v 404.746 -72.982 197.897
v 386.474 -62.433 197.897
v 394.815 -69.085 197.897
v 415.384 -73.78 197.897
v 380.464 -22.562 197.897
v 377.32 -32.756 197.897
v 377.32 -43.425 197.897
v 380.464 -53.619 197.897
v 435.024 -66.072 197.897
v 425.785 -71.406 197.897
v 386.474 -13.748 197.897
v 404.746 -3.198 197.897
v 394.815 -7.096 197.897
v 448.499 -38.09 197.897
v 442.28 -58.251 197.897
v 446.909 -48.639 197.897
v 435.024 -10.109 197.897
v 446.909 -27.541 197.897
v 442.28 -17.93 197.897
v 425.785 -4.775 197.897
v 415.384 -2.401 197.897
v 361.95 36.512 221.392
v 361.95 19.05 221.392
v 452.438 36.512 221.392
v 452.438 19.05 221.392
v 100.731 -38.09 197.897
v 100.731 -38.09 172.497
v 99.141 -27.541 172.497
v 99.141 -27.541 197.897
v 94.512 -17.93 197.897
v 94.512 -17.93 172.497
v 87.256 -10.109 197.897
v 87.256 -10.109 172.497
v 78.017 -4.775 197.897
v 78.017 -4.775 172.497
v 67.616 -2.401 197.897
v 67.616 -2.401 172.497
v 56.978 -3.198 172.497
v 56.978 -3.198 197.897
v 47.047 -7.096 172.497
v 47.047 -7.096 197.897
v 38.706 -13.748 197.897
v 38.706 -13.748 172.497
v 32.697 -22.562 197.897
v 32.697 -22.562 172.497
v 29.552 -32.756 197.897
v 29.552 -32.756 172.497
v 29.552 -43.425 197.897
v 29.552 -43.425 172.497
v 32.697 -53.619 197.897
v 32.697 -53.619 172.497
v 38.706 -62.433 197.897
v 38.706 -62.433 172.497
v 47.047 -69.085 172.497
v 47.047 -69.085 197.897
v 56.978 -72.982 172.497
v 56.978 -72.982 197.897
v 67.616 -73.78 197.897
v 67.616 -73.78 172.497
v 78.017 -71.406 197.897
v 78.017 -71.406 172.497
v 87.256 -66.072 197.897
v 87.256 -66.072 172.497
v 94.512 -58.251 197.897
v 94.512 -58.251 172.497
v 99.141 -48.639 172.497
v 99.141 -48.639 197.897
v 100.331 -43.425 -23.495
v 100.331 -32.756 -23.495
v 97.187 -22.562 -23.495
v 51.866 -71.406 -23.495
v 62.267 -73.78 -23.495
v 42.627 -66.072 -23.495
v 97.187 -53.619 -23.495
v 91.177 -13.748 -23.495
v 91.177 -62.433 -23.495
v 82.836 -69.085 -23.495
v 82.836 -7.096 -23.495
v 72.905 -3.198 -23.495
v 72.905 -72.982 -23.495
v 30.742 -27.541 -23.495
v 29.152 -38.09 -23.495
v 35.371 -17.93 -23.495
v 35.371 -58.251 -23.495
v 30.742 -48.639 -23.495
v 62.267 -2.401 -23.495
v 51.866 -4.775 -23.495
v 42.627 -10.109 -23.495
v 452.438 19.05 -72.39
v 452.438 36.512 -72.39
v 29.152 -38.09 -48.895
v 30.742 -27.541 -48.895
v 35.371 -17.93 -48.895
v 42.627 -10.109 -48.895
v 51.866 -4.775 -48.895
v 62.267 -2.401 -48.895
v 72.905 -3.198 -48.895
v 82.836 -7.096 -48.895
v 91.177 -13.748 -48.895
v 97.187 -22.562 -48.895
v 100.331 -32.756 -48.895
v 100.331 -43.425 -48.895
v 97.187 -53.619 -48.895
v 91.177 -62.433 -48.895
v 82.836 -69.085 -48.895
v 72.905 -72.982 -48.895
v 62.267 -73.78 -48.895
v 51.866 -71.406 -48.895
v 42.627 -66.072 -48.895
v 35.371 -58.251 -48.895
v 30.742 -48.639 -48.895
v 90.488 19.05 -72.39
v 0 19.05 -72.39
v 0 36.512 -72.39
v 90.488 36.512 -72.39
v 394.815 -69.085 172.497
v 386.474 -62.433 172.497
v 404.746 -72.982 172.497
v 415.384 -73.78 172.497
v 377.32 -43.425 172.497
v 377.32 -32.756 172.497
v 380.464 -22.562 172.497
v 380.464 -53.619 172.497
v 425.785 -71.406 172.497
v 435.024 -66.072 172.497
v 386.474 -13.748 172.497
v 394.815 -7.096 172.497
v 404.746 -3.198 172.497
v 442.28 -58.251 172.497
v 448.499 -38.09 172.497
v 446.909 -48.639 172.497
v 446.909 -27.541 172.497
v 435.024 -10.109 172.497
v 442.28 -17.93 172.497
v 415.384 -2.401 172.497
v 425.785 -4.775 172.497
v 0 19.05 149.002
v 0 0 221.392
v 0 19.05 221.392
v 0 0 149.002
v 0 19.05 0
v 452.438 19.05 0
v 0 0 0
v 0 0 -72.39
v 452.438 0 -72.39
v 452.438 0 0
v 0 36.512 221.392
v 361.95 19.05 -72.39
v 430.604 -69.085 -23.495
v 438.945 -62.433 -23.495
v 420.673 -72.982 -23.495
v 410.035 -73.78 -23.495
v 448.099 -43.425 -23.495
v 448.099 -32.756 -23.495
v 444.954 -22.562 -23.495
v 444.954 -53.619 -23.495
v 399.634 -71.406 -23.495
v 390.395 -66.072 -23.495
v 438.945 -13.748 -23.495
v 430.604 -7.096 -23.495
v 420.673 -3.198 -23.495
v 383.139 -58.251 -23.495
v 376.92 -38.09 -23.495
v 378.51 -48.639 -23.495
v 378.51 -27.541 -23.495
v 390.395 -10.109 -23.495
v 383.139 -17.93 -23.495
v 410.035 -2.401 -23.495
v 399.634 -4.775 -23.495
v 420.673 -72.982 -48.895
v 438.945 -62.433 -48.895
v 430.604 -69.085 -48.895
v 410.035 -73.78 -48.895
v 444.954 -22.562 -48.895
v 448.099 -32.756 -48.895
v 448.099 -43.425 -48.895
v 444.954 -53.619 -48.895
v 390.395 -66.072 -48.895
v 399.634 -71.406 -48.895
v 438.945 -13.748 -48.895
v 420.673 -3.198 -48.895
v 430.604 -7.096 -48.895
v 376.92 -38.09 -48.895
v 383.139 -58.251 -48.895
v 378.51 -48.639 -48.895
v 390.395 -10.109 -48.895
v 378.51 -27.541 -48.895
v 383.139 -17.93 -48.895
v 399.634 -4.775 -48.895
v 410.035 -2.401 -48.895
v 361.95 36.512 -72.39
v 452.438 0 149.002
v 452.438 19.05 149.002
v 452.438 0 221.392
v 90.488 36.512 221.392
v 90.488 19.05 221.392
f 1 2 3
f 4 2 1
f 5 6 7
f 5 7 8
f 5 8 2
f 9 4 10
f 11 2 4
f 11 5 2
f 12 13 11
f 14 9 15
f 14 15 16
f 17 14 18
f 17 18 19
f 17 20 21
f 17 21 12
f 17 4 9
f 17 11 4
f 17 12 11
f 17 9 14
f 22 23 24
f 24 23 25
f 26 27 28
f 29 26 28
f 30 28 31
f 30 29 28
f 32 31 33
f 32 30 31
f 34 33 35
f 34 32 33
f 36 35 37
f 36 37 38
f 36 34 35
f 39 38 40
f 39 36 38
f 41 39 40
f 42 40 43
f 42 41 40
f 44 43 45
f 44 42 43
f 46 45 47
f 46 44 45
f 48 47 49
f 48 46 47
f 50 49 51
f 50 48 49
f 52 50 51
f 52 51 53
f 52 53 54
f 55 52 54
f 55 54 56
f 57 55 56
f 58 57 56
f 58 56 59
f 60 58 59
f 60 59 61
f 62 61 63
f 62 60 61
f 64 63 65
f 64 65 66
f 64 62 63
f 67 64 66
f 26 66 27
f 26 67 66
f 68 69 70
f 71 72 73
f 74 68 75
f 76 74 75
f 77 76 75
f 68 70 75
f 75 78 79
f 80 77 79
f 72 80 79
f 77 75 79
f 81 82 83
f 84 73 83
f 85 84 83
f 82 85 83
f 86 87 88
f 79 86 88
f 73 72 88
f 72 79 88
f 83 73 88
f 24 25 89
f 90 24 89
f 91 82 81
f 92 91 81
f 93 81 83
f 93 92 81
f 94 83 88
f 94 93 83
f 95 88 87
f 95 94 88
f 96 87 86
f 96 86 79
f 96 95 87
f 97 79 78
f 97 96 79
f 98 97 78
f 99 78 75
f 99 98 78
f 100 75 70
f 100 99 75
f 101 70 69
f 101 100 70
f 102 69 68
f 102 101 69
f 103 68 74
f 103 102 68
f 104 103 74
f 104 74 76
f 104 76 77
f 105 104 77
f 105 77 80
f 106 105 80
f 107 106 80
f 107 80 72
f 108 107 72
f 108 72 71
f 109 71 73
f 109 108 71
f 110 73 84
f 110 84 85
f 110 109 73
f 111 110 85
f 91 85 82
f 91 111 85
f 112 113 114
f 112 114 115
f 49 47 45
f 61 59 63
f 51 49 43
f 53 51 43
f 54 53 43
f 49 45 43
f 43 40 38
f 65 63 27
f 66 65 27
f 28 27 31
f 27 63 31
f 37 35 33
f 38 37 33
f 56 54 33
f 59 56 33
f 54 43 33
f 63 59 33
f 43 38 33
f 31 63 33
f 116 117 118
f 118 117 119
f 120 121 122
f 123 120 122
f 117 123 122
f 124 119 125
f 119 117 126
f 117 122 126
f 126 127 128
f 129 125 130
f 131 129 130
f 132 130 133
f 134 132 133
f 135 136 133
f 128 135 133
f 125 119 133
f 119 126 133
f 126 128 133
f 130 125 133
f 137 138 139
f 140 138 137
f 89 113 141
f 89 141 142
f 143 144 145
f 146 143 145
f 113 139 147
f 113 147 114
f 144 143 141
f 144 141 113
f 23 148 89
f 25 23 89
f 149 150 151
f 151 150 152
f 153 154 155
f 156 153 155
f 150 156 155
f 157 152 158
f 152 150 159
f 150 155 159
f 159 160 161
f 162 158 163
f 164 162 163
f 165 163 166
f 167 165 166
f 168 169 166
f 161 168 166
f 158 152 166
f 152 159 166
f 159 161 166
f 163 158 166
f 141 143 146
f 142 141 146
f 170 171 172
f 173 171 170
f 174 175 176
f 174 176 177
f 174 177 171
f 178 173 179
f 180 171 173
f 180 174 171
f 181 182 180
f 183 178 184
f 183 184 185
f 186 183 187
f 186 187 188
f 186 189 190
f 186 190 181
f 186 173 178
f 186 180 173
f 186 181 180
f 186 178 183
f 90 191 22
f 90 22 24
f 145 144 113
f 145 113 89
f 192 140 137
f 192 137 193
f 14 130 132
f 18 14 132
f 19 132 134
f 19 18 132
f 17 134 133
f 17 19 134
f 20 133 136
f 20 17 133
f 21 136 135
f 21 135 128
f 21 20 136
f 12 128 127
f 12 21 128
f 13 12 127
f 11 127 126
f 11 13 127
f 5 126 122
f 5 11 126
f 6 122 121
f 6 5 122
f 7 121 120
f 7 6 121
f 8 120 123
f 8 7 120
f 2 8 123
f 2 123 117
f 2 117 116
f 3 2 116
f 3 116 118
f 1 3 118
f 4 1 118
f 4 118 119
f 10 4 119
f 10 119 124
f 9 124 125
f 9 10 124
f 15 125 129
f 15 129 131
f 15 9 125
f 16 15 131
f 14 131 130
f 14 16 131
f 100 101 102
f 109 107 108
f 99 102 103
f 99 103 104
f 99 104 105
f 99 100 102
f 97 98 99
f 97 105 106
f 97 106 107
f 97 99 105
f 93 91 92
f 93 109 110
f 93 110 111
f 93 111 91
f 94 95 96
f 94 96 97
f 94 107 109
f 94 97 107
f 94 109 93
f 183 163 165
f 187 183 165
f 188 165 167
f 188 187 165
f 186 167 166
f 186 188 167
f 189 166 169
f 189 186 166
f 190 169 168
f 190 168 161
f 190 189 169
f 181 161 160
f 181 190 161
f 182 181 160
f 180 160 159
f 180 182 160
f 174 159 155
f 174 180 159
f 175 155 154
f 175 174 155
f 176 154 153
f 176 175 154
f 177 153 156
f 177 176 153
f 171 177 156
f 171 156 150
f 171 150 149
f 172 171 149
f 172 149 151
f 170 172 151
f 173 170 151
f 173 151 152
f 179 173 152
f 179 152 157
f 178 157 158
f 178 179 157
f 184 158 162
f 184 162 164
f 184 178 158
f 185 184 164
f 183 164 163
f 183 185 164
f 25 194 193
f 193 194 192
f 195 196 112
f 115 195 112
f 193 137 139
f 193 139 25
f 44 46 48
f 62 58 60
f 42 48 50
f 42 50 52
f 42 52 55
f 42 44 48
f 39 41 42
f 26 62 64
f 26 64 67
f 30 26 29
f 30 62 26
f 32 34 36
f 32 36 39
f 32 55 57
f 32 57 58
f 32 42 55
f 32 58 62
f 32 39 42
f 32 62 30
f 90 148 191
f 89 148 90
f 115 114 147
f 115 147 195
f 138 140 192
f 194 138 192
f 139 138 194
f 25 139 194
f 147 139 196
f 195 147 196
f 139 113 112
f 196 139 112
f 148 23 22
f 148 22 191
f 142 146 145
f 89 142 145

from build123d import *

# Parameters (mm, degrees)
SKETCH1_W                  = 452.4375
SKETCH1_H                  = 72.39
BOSS_EXTRUDE1_DEPTH        = 19.05
BOSS_EXTRUDE1_2_DEPTH      = 19.05
SKETCH2_W                  = 90.4875
SKETCH2_H                  = 293.781971524
BOSS_EXTRUDE2_DEPTH        = 17.4625
BOSS_EXTRUDE2_2_DEPTH      = 17.4625
SKETCH3_R                  = 35.789243898
BOSS_EXTRUDE3_DEPTH        = 12.7
BOSS_EXTRUDE3_DEPTH_BACK   = 12.7
BOSS_EXTRUDE3_2_DEPTH      = 12.7
BOSS_EXTRUDE3_2_DEPTH_BACK = 12.7
SKETCH4_R                  = 35.789243898
BOSS_EXTRUDE4_DEPTH        = 12.7
BOSS_EXTRUDE4_DEPTH_BACK   = 12.7
BOSS_EXTRUDE4_2_DEPTH      = 12.7
BOSS_EXTRUDE4_2_DEPTH_BACK = 12.7


with BuildPart() as part:
    # Sketch1 → Boss-Extrude1 (new body)
    with BuildSketch(Plane(origin=(0, 0, 0), x_dir=(1, 0, 0), z_dir=(0, 1, 0))):
        with Locations((226.21875, 36.195)):
            Rectangle(SKETCH1_W, SKETCH1_H)
    extrude(amount=BOSS_EXTRUDE1_DEPTH)


with BuildPart() as body_2:
    # Sketch1 → Boss-Extrude1 2 (new body)
    with BuildSketch(Plane(origin=(0, 0, 0), x_dir=(1, 0, 0), z_dir=(0, 1, 0))):
        with Locations((226.21875, -185.196971524)):
            Rectangle(SKETCH1_W, SKETCH1_H)
    extrude(amount=BOSS_EXTRUDE1_2_DEPTH)


with BuildPart() as body_3:
    # Sketch2 → Boss-Extrude2 (new body)
    with BuildSketch(Plane(origin=(0, 19.05, 0), x_dir=(1, 0, 0), z_dir=(0, 1, 0))):
        with Locations((407.19375, -74.500985762)):
            Rectangle(SKETCH2_W, SKETCH2_H)
    extrude(amount=BOSS_EXTRUDE2_DEPTH)


with BuildPart() as body_4:
    # Sketch2 → Boss-Extrude2 2 (new body)
    with BuildSketch(Plane(origin=(0, 19.05, 0), x_dir=(1, 0, 0), z_dir=(0, 1, 0))):
        with Locations((45.24375, -74.500985762)):
            Rectangle(SKETCH2_W, SKETCH2_H)
    extrude(amount=BOSS_EXTRUDE2_2_DEPTH)


with BuildPart() as body_5:
    # Sketch3 → Boss-Extrude3 (new body, two sides)
    with BuildSketch(Plane.XY.offset(185.196971524)) as boss_extrude3_sk:
        with Locations((64.941566703, -38.090416539)):
            Circle(SKETCH3_R)
    extrude(amount=BOSS_EXTRUDE3_DEPTH)
    extrude(boss_extrude3_sk.sketch, amount=-BOSS_EXTRUDE3_DEPTH_BACK)


with BuildPart() as body_6:
    # Sketch3 → Boss-Extrude3 2 (new body, two sides)
    with BuildSketch(Plane.XY.offset(185.196971524)) as boss_extrude3_2_sk:
        with Locations((412.709416413, -38.090416539)):
            Circle(SKETCH3_R)
    extrude(amount=BOSS_EXTRUDE3_2_DEPTH)
    extrude(boss_extrude3_2_sk.sketch, amount=-BOSS_EXTRUDE3_2_DEPTH_BACK)


with BuildPart() as body_7:
    # Sketch4 → Boss-Extrude4 (new body, two sides)
    with BuildSketch(Plane(origin=(0, 0, -36.195), x_dir=(-1, 0, 0), z_dir=(0, 0, -1))) as boss_extrude4_sk:
        with Locations((-64.941566703, -38.090416539)):
            Circle(SKETCH4_R)
    extrude(amount=BOSS_EXTRUDE4_DEPTH)
    extrude(boss_extrude4_sk.sketch, amount=-BOSS_EXTRUDE4_DEPTH_BACK)


with BuildPart() as body_8:
    # Sketch4 → Boss-Extrude4 2 (new body, two sides)
    with BuildSketch(Plane(origin=(0, 0, -36.195), x_dir=(-1, 0, 0), z_dir=(0, 0, -1))) as boss_extrude4_2_sk:
        with Locations((-412.709416413, -38.090416539)):
            Circle(SKETCH4_R)
    extrude(amount=BOSS_EXTRUDE4_2_DEPTH)
    extrude(boss_extrude4_2_sk.sketch, amount=-BOSS_EXTRUDE4_2_DEPTH_BACK)


solid = Compound([part.part, body_2.part, body_3.part, body_4.part, body_5.part, body_6.part, body_7.part, body_8.part])
